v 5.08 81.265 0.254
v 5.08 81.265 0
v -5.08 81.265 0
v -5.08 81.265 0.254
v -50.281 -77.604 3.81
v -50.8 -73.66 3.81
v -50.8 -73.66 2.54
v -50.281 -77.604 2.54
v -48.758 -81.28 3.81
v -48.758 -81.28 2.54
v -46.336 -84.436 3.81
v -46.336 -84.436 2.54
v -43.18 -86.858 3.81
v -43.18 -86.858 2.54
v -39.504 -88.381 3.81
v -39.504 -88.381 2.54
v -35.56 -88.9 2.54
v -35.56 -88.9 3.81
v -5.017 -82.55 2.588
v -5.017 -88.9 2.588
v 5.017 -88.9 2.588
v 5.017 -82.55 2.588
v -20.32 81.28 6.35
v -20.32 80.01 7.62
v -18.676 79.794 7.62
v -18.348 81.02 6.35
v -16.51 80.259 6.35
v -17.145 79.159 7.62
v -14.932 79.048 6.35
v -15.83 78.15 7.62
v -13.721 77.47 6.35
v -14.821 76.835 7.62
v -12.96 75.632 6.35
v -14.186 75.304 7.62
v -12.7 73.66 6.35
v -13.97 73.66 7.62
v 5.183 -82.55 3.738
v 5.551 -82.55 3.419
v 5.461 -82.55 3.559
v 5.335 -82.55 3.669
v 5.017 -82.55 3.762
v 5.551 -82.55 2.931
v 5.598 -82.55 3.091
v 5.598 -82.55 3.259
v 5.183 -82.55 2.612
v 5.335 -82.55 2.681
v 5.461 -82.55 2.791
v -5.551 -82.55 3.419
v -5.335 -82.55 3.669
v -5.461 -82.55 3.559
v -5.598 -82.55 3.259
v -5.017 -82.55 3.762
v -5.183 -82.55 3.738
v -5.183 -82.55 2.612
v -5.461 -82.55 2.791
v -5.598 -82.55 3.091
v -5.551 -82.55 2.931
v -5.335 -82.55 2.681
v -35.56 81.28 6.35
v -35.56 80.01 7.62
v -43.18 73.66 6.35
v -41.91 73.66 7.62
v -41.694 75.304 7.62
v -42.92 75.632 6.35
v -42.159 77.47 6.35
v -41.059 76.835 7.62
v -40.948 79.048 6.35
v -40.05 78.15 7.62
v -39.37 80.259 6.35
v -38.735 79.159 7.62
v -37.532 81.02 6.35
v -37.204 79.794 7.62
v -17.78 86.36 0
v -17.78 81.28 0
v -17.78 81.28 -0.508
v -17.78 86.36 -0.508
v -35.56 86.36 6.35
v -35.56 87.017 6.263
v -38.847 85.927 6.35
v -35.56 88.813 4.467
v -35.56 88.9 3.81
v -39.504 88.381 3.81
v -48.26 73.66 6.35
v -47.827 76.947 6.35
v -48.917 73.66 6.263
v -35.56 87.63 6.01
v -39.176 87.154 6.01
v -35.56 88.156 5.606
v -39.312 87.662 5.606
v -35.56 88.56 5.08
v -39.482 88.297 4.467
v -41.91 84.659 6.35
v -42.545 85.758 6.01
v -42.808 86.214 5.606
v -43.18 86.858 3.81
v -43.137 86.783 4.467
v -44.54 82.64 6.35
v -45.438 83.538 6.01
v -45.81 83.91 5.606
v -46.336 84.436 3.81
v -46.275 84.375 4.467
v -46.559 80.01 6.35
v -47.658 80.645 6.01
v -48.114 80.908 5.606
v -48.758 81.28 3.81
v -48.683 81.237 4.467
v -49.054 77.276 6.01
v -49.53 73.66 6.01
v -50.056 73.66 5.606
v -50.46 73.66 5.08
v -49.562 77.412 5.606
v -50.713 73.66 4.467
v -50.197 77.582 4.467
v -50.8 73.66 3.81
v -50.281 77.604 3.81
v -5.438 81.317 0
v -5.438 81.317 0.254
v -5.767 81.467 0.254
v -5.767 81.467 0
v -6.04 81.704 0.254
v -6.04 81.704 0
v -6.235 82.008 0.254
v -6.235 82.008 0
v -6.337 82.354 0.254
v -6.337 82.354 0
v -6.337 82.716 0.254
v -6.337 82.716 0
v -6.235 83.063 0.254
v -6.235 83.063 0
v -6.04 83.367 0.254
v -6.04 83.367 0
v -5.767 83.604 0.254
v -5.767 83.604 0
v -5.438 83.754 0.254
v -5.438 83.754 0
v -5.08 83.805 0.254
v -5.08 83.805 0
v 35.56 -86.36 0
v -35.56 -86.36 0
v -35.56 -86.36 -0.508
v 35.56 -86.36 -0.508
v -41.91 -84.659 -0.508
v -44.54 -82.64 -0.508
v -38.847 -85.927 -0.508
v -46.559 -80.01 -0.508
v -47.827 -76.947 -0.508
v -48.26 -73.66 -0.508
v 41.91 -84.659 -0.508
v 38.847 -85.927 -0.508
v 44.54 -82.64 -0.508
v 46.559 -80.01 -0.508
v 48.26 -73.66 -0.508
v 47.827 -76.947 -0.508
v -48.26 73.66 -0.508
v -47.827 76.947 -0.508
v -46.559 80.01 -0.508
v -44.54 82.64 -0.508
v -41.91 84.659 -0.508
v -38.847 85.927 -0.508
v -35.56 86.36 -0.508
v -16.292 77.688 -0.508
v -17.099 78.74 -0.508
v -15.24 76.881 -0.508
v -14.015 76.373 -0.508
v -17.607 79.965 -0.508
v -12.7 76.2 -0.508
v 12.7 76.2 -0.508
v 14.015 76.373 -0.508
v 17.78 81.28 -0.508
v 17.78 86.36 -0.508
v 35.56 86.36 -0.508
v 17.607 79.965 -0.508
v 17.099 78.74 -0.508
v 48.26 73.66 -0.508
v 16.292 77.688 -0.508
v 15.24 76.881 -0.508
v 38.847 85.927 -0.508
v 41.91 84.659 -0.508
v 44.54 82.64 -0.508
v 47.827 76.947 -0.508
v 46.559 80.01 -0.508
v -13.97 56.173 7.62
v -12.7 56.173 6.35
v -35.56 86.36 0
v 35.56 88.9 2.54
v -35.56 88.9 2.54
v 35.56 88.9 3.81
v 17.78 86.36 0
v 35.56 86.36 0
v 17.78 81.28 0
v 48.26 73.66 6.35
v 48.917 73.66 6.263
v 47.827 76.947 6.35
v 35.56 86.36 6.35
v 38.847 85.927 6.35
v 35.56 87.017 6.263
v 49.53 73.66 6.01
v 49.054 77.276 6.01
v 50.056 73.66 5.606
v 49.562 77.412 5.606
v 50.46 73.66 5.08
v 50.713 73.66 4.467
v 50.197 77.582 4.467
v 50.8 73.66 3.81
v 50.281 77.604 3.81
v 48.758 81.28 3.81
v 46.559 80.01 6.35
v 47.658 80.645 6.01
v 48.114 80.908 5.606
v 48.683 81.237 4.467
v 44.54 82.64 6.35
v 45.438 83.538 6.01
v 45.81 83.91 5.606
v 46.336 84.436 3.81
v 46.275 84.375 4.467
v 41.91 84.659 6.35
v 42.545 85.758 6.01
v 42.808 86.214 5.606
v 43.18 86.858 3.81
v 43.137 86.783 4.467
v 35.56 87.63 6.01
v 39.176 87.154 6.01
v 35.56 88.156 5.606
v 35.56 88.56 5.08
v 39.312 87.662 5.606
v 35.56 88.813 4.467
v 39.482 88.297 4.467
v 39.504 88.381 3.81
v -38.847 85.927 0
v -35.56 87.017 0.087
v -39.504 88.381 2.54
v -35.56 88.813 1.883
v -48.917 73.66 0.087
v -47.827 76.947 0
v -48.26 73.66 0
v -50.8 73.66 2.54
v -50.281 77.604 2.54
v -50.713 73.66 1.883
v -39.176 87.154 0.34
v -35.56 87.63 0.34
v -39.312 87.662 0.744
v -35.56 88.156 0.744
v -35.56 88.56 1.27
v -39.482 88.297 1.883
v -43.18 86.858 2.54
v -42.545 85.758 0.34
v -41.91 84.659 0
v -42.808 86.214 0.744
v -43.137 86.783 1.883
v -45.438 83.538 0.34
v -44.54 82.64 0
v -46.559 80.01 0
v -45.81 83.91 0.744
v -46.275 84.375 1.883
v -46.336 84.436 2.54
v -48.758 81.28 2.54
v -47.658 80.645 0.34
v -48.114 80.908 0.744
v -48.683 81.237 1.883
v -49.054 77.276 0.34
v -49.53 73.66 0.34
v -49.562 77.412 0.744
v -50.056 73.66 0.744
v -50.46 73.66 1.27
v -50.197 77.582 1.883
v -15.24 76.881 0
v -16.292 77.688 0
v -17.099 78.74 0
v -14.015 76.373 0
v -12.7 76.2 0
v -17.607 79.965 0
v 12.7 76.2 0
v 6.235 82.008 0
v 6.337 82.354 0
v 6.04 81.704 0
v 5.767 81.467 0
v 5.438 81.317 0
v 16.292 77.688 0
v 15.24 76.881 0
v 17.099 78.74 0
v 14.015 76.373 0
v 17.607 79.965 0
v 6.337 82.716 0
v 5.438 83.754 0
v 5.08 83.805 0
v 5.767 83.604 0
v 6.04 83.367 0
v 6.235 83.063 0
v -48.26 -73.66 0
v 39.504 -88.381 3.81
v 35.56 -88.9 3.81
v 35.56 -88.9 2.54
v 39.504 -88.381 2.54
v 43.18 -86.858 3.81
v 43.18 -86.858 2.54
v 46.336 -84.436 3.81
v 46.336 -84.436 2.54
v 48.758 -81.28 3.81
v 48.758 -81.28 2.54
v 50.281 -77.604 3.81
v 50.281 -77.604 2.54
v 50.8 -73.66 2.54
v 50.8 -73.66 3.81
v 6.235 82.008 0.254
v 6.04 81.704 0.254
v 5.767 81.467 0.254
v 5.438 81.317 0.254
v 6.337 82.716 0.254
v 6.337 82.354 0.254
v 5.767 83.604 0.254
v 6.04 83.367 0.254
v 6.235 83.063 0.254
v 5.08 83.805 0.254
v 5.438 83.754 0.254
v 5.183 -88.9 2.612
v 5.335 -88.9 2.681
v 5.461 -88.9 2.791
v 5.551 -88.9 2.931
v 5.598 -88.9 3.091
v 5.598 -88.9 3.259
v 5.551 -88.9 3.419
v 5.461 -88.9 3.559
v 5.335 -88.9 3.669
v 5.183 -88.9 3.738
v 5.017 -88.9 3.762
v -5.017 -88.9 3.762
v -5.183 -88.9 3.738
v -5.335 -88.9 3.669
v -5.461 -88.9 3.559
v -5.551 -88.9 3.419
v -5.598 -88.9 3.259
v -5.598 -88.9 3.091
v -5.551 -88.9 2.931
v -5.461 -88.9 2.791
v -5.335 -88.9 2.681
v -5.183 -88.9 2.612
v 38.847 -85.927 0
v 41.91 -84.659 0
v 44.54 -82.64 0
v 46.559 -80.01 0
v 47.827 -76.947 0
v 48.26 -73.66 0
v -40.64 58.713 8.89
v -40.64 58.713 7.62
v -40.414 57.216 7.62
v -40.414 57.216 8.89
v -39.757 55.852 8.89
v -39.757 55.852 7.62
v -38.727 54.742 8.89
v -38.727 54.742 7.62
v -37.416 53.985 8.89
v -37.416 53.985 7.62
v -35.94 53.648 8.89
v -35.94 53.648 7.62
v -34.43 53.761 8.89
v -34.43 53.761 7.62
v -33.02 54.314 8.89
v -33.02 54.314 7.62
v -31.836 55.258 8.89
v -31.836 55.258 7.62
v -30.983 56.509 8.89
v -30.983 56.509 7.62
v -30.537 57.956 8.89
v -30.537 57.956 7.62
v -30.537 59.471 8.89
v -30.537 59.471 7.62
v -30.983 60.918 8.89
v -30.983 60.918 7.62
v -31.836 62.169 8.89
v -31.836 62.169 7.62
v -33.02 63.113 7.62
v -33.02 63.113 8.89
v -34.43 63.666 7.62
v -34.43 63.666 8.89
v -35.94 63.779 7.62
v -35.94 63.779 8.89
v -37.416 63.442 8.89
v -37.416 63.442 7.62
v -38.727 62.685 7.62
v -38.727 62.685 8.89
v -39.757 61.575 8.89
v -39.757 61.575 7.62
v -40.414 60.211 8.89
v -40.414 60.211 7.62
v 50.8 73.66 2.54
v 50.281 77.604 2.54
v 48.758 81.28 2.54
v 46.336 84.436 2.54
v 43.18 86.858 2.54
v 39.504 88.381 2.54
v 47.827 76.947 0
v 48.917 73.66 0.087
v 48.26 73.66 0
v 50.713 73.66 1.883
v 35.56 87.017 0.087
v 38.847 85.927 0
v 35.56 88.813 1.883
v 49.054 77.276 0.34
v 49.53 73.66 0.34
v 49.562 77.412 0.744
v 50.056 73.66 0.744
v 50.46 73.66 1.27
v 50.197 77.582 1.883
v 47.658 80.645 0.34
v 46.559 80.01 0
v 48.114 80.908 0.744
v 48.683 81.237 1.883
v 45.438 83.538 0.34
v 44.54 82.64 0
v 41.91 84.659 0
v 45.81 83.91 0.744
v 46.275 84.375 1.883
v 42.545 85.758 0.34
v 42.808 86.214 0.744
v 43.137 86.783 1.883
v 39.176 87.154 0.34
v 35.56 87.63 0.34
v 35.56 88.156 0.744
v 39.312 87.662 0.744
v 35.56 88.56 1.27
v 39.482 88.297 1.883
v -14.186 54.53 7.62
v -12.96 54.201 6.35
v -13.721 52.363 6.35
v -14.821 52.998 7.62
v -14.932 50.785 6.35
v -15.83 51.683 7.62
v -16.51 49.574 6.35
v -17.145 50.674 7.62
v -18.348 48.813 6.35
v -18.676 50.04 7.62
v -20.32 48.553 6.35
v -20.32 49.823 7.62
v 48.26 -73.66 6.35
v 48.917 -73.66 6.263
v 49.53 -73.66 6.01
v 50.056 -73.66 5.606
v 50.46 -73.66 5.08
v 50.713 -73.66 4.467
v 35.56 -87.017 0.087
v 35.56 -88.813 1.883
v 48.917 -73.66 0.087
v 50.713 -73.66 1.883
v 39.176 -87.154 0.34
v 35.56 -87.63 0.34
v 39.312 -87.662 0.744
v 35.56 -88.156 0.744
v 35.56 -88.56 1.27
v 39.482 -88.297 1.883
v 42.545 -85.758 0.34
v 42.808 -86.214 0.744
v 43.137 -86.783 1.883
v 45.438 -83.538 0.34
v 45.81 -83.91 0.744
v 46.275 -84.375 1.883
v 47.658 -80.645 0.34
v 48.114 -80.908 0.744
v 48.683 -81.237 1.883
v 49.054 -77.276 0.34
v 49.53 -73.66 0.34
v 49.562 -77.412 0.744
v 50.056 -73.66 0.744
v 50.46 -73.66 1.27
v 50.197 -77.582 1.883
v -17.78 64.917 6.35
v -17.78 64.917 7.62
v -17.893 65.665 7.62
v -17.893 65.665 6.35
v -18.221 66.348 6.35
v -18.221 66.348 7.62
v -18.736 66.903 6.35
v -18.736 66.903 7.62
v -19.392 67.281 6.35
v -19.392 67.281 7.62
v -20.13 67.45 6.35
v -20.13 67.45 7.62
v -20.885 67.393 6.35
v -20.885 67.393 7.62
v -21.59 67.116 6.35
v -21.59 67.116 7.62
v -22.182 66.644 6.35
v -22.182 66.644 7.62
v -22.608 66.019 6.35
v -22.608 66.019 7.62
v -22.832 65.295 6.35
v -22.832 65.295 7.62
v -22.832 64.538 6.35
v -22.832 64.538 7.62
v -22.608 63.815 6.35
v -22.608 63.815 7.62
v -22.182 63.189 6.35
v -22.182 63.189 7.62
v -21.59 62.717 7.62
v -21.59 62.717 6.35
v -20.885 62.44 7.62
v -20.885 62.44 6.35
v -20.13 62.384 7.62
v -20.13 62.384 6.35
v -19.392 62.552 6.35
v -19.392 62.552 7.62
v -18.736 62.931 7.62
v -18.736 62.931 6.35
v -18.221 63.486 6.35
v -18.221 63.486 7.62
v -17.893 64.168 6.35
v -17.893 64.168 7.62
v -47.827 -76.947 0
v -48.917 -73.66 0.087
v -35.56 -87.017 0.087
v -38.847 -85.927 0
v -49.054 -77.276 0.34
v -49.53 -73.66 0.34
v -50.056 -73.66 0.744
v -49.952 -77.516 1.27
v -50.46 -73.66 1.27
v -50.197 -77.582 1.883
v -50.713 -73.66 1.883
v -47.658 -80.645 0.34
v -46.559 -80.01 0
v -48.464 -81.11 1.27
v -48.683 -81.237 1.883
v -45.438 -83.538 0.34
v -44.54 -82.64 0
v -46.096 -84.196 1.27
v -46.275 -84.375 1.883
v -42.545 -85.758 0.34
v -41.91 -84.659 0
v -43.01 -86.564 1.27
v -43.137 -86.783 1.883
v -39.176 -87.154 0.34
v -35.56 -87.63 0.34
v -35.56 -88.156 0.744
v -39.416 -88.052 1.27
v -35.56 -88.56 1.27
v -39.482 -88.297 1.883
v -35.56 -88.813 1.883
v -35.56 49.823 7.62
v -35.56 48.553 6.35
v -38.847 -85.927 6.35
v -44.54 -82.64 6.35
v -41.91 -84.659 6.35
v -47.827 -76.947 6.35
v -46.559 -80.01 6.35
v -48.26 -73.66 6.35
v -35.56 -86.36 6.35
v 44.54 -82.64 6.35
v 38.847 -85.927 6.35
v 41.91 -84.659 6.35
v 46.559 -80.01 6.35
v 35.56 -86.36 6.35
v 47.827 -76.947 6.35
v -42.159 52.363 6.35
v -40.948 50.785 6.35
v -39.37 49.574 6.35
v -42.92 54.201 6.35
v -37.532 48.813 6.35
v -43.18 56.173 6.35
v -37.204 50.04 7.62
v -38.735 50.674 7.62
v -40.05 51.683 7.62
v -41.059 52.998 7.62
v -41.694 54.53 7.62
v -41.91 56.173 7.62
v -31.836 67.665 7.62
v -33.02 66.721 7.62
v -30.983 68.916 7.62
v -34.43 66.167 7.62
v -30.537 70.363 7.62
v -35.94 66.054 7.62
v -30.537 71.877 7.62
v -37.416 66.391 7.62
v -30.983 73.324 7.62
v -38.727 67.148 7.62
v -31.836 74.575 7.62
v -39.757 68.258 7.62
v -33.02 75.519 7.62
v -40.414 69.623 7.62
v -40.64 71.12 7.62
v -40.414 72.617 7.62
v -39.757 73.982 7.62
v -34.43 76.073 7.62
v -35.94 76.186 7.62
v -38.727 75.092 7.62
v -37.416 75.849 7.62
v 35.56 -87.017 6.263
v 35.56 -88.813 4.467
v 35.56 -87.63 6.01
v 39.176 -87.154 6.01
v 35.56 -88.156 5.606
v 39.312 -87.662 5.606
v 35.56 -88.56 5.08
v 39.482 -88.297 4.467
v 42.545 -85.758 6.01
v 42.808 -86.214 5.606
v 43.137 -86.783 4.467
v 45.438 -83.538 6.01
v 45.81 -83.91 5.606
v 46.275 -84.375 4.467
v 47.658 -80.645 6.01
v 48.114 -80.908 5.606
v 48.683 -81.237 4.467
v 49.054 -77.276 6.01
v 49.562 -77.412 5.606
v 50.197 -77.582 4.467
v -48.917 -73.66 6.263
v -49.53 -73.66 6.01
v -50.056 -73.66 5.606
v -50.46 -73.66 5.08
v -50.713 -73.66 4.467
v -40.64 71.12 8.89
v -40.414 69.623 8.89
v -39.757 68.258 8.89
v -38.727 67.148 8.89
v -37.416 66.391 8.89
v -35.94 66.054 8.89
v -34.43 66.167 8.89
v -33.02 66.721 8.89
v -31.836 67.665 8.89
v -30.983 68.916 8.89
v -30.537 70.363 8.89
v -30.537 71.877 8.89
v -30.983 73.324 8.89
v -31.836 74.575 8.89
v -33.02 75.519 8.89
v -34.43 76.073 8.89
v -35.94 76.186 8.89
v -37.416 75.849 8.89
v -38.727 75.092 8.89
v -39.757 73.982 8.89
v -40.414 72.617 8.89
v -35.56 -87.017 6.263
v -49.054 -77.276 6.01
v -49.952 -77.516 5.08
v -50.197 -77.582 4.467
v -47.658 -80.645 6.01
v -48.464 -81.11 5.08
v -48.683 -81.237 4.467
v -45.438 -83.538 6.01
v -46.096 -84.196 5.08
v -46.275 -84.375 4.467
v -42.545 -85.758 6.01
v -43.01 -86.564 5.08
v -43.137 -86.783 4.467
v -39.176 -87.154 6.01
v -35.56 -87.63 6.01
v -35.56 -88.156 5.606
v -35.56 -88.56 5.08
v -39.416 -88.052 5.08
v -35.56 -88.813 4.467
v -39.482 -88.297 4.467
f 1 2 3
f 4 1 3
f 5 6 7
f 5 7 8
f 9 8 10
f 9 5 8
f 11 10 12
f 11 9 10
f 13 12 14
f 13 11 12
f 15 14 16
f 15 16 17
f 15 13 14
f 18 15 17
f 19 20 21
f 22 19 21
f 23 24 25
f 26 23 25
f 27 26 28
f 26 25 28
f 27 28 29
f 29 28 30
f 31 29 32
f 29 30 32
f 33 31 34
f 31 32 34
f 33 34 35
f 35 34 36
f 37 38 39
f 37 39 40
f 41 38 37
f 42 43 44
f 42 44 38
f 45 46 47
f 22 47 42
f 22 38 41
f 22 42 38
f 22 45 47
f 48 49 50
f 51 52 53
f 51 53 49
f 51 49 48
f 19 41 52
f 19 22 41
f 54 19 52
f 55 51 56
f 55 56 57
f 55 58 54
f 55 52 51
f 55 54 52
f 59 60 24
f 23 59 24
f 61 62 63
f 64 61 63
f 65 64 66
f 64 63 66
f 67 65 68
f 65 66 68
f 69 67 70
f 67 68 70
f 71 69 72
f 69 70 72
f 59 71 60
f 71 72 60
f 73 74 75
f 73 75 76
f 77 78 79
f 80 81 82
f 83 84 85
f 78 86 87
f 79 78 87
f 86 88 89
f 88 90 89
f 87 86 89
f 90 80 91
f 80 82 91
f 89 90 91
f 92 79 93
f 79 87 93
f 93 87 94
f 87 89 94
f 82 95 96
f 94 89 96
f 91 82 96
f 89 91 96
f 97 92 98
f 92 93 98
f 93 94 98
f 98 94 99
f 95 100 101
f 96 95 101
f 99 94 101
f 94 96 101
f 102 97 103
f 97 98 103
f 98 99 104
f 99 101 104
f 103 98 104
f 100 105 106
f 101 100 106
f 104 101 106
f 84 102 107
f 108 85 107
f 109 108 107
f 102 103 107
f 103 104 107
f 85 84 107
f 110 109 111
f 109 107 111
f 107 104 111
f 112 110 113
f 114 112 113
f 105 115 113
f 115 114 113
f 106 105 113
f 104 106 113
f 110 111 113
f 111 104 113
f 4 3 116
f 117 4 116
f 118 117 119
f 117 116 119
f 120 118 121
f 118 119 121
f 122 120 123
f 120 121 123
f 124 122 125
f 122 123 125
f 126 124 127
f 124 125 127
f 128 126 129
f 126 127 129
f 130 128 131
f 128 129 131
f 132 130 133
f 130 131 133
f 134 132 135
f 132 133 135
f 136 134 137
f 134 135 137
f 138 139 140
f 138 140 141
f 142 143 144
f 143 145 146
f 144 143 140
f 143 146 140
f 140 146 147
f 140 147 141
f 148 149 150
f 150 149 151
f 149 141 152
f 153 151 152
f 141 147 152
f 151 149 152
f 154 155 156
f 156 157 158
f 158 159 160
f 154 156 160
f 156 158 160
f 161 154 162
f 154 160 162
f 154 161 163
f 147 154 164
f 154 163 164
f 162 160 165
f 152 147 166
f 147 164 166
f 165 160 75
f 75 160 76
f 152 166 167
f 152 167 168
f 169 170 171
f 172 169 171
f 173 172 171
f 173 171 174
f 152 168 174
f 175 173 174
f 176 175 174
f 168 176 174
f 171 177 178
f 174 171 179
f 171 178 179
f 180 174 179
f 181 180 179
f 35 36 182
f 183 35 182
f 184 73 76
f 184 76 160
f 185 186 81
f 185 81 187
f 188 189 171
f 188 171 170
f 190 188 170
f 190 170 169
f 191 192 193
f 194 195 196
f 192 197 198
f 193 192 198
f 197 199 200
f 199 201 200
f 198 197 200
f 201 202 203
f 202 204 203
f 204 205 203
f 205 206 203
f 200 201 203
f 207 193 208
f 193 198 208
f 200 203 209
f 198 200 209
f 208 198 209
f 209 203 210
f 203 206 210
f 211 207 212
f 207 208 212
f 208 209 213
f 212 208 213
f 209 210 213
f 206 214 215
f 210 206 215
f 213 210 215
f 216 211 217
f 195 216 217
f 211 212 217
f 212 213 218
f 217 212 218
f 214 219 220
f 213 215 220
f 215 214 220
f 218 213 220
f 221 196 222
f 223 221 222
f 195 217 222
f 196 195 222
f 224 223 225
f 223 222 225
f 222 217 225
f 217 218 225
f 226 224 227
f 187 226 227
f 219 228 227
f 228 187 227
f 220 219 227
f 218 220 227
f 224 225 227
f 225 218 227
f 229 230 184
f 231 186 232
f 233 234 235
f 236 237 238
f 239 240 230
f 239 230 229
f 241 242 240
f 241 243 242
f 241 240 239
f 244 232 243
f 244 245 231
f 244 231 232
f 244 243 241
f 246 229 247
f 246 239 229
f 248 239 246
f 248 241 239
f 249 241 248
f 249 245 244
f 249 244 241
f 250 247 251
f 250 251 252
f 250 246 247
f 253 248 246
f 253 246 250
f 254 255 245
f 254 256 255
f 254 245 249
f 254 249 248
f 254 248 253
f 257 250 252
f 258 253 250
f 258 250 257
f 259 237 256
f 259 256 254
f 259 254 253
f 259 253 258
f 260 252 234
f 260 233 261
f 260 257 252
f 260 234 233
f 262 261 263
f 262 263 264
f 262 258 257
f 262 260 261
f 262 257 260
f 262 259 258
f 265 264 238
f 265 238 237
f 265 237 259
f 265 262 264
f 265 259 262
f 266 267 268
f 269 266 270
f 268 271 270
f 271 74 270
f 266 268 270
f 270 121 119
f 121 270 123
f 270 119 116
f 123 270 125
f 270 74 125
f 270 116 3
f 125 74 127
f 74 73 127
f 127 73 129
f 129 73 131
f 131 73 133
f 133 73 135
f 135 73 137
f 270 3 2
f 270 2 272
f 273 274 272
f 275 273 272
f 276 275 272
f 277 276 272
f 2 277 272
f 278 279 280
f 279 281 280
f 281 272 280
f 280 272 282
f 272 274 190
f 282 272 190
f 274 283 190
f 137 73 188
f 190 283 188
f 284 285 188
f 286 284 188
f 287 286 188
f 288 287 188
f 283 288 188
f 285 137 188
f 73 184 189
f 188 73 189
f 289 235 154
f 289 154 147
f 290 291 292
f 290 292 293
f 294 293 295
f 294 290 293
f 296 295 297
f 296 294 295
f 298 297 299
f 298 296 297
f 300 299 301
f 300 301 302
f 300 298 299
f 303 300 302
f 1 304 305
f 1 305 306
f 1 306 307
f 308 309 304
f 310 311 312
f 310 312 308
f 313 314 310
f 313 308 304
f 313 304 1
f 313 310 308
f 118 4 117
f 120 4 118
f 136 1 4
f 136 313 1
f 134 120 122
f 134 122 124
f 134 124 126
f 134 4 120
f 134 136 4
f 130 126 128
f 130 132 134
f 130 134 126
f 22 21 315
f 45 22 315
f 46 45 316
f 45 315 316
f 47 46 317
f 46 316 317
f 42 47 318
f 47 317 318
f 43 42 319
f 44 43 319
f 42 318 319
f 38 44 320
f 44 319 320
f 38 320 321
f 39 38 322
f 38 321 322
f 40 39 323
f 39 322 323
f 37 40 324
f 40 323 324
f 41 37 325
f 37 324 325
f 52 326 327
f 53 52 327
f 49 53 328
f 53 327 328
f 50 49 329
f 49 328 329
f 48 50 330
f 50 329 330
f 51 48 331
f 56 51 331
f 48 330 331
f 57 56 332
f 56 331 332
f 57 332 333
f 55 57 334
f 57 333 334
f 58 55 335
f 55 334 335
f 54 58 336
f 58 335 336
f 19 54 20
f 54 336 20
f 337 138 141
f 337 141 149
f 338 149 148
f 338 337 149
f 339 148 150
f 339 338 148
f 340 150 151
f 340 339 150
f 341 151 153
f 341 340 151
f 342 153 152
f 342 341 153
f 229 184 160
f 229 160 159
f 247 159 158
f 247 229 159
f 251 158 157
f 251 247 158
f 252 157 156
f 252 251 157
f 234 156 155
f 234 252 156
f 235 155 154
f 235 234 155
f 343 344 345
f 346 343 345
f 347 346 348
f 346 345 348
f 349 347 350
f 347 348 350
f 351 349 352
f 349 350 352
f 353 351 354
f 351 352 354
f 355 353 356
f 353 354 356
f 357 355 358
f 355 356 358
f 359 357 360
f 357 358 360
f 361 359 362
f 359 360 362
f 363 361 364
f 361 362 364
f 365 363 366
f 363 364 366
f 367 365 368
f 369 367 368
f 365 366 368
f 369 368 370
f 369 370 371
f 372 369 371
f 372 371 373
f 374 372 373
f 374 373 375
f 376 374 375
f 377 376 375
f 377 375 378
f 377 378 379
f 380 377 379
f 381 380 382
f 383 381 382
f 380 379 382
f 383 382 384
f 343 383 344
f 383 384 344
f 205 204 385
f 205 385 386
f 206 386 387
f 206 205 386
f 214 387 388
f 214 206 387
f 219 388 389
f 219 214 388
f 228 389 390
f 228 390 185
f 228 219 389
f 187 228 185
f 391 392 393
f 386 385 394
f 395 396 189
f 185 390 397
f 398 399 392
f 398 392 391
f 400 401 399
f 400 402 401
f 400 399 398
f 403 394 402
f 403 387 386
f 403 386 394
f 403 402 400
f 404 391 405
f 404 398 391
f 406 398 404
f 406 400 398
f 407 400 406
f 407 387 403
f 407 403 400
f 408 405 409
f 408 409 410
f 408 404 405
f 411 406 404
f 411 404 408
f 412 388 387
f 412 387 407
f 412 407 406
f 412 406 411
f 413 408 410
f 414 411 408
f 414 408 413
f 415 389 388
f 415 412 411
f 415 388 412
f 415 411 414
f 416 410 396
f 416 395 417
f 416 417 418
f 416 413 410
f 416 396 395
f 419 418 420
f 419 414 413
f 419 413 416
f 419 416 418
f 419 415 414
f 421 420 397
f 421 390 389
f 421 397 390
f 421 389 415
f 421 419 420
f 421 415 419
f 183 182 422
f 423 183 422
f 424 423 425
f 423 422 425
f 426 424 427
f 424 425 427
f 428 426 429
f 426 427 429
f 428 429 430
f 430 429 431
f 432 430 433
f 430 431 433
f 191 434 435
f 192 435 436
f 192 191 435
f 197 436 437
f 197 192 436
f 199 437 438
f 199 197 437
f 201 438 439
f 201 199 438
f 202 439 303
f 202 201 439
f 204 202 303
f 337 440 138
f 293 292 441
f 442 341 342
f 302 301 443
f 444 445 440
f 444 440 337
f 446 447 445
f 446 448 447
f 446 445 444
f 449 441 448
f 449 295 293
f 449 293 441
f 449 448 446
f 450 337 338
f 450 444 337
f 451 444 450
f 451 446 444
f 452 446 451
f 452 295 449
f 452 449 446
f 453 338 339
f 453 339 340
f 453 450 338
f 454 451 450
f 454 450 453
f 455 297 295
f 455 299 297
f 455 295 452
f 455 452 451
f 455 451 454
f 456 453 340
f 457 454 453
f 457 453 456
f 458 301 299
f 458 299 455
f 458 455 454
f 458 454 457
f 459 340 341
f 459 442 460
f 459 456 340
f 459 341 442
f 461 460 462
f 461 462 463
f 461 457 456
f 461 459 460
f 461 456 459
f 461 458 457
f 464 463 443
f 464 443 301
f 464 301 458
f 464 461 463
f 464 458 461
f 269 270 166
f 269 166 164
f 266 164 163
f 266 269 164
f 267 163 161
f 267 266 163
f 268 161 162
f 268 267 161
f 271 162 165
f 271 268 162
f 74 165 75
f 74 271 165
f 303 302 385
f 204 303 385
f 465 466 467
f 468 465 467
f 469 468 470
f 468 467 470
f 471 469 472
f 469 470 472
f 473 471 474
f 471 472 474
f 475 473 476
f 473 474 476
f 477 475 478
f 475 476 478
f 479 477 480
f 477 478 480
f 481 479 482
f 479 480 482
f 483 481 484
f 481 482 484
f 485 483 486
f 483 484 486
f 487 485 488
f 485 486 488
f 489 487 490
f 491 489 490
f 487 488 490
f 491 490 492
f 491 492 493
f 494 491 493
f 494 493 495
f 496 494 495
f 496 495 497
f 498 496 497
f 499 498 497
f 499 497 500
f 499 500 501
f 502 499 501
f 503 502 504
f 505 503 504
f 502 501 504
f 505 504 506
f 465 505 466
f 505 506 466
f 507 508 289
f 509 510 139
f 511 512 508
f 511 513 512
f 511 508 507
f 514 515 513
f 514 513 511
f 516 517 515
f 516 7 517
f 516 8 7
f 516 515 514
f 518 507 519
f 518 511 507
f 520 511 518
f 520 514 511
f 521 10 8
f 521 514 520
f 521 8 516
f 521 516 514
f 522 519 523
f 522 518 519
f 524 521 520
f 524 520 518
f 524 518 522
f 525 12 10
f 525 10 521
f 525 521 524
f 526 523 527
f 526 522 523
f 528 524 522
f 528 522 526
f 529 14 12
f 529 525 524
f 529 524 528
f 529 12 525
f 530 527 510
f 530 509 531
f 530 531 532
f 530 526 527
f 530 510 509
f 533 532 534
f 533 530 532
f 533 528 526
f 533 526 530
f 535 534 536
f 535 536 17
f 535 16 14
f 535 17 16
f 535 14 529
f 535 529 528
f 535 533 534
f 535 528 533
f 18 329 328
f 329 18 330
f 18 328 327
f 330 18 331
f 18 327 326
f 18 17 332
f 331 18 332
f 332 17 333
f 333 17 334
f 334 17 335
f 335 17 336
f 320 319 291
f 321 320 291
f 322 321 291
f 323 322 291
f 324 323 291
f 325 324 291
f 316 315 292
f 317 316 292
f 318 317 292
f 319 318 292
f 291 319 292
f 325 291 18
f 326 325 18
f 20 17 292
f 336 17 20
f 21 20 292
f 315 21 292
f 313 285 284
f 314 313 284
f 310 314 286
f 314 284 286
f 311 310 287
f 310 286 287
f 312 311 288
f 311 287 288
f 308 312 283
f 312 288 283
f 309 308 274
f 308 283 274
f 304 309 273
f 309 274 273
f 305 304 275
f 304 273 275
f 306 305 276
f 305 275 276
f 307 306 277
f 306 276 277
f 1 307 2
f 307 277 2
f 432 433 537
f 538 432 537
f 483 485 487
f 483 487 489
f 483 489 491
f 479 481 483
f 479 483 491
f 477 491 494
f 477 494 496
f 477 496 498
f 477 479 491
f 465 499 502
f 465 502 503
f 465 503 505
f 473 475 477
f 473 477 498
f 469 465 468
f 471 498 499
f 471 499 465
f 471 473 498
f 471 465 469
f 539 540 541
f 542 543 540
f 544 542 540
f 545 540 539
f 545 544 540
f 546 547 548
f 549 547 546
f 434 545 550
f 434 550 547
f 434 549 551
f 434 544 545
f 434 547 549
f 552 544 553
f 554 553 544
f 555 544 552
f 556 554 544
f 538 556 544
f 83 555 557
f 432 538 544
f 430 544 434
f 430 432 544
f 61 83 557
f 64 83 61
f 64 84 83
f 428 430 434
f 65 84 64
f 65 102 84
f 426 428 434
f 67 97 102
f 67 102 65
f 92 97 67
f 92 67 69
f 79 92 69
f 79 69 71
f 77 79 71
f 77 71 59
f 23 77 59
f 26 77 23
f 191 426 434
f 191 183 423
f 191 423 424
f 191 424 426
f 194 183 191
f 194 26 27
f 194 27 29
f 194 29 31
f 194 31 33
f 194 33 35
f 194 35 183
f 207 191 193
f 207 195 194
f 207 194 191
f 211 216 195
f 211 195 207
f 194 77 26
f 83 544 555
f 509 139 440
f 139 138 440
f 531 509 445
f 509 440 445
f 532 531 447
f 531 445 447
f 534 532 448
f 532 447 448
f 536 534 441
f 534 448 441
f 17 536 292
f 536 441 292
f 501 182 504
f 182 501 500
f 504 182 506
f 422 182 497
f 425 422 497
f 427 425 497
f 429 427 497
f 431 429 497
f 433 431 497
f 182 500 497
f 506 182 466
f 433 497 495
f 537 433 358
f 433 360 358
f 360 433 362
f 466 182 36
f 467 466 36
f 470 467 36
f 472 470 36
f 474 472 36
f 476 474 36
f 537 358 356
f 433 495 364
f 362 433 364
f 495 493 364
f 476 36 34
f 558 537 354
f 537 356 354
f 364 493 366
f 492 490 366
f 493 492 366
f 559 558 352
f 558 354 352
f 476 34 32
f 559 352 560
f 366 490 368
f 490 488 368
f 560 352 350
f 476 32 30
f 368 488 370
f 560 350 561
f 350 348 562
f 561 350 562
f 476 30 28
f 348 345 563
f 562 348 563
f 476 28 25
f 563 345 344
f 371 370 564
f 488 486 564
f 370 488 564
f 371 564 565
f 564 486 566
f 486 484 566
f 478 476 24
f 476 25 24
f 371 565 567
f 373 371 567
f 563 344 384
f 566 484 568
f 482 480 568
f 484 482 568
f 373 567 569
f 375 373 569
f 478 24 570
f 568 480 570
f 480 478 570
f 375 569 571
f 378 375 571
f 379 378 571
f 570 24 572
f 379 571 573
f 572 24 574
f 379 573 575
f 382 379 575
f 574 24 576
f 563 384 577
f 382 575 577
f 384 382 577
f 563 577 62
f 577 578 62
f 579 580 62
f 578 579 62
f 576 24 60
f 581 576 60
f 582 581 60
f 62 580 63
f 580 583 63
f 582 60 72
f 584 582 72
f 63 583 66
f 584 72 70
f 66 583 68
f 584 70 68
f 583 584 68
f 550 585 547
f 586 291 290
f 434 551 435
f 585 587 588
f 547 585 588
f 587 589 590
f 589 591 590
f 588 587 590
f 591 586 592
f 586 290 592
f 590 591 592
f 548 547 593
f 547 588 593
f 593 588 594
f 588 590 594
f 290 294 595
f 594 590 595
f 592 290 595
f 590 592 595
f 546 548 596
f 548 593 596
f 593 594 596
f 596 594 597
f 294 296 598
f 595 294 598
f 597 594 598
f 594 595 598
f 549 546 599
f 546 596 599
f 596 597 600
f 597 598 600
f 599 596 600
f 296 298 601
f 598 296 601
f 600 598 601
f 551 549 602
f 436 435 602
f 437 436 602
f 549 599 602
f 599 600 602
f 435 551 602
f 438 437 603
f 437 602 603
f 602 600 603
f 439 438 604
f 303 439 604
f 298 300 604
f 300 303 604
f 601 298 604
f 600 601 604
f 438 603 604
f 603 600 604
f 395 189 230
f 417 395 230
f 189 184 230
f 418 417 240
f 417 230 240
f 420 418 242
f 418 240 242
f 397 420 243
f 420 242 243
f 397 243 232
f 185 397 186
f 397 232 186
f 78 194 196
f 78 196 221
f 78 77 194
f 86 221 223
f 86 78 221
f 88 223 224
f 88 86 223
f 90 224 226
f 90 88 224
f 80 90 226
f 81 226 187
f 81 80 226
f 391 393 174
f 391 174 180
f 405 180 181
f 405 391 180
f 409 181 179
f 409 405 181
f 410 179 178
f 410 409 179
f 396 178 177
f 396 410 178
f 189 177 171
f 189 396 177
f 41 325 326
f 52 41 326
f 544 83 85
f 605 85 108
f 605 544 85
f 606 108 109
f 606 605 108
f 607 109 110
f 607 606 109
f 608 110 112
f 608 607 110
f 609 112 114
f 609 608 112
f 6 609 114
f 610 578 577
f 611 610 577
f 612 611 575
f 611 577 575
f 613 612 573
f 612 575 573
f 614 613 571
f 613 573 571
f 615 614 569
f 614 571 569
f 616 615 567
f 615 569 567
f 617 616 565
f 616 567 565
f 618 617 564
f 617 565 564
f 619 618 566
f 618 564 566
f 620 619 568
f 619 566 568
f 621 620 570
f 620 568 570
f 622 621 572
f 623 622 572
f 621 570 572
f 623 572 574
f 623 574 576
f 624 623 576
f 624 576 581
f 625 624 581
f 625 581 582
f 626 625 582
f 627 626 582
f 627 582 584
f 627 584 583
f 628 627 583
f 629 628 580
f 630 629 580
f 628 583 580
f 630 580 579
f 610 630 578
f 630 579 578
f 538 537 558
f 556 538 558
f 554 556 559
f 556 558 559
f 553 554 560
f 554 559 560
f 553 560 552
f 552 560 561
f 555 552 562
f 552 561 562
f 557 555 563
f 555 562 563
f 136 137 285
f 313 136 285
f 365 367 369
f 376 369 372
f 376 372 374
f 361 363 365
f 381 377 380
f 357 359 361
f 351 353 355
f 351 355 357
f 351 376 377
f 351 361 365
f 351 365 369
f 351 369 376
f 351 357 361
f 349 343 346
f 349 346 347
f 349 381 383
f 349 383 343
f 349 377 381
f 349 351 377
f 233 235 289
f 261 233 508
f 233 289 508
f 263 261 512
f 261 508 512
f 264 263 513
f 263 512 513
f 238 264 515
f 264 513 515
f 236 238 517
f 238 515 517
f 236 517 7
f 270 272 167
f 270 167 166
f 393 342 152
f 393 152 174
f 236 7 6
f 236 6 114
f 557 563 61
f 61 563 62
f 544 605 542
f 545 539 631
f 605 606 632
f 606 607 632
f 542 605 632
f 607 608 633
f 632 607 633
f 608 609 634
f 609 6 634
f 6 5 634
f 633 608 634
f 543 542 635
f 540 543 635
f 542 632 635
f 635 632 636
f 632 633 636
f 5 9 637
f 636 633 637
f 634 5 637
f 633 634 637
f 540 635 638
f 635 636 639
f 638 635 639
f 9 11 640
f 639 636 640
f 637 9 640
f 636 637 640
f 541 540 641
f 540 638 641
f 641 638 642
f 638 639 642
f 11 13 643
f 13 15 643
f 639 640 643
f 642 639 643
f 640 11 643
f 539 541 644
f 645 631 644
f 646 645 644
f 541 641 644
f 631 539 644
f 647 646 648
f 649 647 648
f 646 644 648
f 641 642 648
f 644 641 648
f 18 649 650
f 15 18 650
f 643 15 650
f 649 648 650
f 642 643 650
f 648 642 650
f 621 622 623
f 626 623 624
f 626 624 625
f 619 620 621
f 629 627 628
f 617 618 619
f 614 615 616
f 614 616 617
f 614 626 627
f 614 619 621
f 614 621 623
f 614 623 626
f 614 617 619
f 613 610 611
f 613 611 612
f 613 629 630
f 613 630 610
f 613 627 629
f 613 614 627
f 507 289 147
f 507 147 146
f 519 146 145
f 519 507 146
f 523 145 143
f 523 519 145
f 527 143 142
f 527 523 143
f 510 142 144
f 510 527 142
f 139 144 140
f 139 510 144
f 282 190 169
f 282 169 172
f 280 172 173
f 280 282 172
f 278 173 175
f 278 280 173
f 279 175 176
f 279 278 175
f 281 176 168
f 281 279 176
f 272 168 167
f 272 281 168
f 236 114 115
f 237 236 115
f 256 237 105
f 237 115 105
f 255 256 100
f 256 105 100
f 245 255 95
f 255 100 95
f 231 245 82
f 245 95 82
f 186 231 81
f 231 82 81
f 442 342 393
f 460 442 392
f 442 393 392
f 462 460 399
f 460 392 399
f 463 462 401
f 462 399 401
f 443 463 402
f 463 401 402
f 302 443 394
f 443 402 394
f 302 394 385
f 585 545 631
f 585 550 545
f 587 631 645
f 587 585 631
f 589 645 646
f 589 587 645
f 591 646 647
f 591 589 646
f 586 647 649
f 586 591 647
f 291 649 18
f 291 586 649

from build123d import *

# Parameters (mm, degrees)
SKETCH1_W            = 101.6
SKETCH1_H            = 177.8
BOSS_EXTRUDE2_DEPTH  = 6.35
FILLET1_R            = 15.24
BOSS_EXTRUDE5_DEPTH  = 0.508
CUT_EXTRUDE1_DEPTH   = 0.254
FILLET3_R            = 2.54
FILLET4_R            = 2.54
BOSS_EXTRUDE7_DEPTH  = 1.27
SKETCH6_R            = 5.08
BOSS_EXTRUDE10_DEPTH = 1.27
SKETCH7_R            = 2.54
CUT_EXTRUDE2_DEPTH   = 1.27
CHAMFER1_SIZE        = 1.27
CUT_EXTRUDE6_DEPTH   = 6.35


with BuildPart() as part:
    # Sketch1 → Boss-Extrude2 (new body)
    with BuildSketch(Plane.XY):
        Rectangle(SKETCH1_W, SKETCH1_H)
    extrude(amount=BOSS_EXTRUDE2_DEPTH)

    # Fillet1
    fillet1_edges = [part.edges().sort_by_distance(p)[0] for p in [
        (50.8, -88.9, 3.175),
        (-50.8, -88.9, 3.175),
        (-50.8, 88.9, 3.175),
        (50.8, 88.9, 3.175),
    ]]
    fillet(fillet1_edges, radius=FILLET1_R)

    # Sketch2 → Boss-Extrude5 (add)
    with BuildSketch(Plane.XY):
        with BuildLine():
            Line((12.7, 76.2), (-12.7, 76.2))
            ThreePointArc((-12.7, 76.2), (-16.292102448, 77.687897552), (-17.78, 81.28))
            Line((-17.78, 81.28), (-17.78, 86.36))
            Line((-17.78, 86.36), (-35.56, 86.36))
            ThreePointArc((-35.56, 86.36), (-44.540256121, 82.640256121), (-48.26, 73.66))
            Line((-48.26, 73.66), (-48.26, -73.66))
            ThreePointArc((-48.26, -73.66), (-44.540256121, -82.640256121), (-35.56, -86.36))
            Line((-35.56, -86.36), (35.56, -86.36))
            ThreePointArc((35.56, -86.36), (44.540256121, -82.640256121), (48.26, -73.66))
            Line((48.26, -73.66), (48.26, 73.66))
            ThreePointArc((48.26, 73.66), (44.540256121, 82.640256121), (35.56, 86.36))
            Line((35.56, 86.36), (17.78, 86.36))
            Line((17.78, 86.36), (17.78, 81.28))
            ThreePointArc((17.78, 81.28), (16.292102448, 77.687897552), (12.7, 76.2))
        make_face()
    extrude(amount=-BOSS_EXTRUDE5_DEPTH)

    # Sketch3 → Cut-Extrude1 (cut)
    with BuildSketch(Plane.XY):
        with BuildLine():
            Line((5.08, 81.26519761), (-5.08, 81.26519761))
            ThreePointArc((-5.08, 81.26519761), (-6.35, 82.53519761), (-5.08, 83.80519761))
            Line((-5.08, 83.80519761), (5.08, 83.80519761))
            ThreePointArc((5.08, 83.80519761), (6.35, 82.53519761), (5.08, 81.26519761))
        make_face()
    extrude(amount=CUT_EXTRUDE1_DEPTH, mode=Mode.SUBTRACT)

    # Fillet3
    fillet3_edges = [part.edges().sort_by_distance(p)[0] for p in [
        (0, -88.9, 0),
        (50.8, 0, 0),
        (-50.8, 0, 0),
        (0, 88.9, 0),
        (-46.336307345, 84.436307345, 0),
        (46.336307345, 84.436307345, 0),
        (46.336307345, -84.436307345, 0),
        (-46.336307345, -84.436307345, 0),
    ]]
    fillet(fillet3_edges, radius=FILLET3_R - 0.0001)  # a hair under: the kernel refuses the full size

    # Fillet4
    fillet4_edges = [part.edges().sort_by_distance(p)[0] for p in [
        (0, -88.9, 6.35),
        (-50.8, 0, 6.35),
        (50.8, 0, 6.35),
        (0, 88.9, 6.35),
        (-46.336307345, 84.436307345, 6.35),
        (46.336307345, 84.436307345, 6.35),
        (46.336307345, -84.436307345, 6.35),
        (-46.336307345, -84.436307345, 6.35),
    ]]
    fillet(fillet4_edges, radius=FILLET4_R)

    # Sketch4 → Boss-Extrude7 (add)
    with BuildSketch(Plane.XY.offset(6.35)):
        with BuildLine():
            Line((-12.7, 73.66), (-12.7, 56.173421011))
            ThreePointArc((-12.7, 56.173421011), (-14.931846327, 50.785267338), (-20.32, 48.553421011))
            Line((-20.32, 48.553421011), (-35.56, 48.553421011))
            ThreePointArc((-35.56, 48.553421011), (-40.948153673, 50.785267338), (-43.18, 56.173421011))
            Line((-43.18, 56.173421011), (-43.18, 73.66))
            ThreePointArc((-43.18, 73.66), (-40.948153673, 79.048153673), (-35.56, 81.28))
            Line((-35.56, 81.28), (-20.32, 81.28))
            ThreePointArc((-20.32, 81.28), (-14.931846327, 79.048153673), (-12.7, 73.66))
        make_face()
    extrude(amount=BOSS_EXTRUDE7_DEPTH)

    # Sketch6 → Boss-Extrude10 (add)
    with BuildSketch(Plane.XY.offset(7.62)):
        with Locations(Location((-35.56, 58.713421011, 0), (0, 0, 180))):
            Circle(SKETCH6_R)
        with Locations(Location((-35.56, 71.12, 0), (0, 0, 180))):
            Circle(SKETCH6_R)
    extrude(amount=BOSS_EXTRUDE10_DEPTH)

    # Sketch7 → Cut-Extrude2 (cut)
    with BuildSketch(Plane.XY.offset(7.62)):
        with Locations((-20.32, 64.916710506)):
            Circle(SKETCH7_R)
    extrude(amount=-CUT_EXTRUDE2_DEPTH, mode=Mode.SUBTRACT)

    # Chamfer1
    chamfer1_edges = [part.edges().sort_by_distance(p)[0] for p in [
        (-27.94, 81.28, 7.62),
        (-14.931846327, 79.048153673, 7.62),
        (-12.7, 64.916710506, 7.62),
        (-14.931846327, 50.785267338, 7.62),
        (-27.94, 48.553421011, 7.62),
        (-40.948153673, 50.785267338, 7.62),
        (-43.18, 64.916710506, 7.62),
        (-40.948153673, 79.048153673, 7.62),
    ]]
    chamfer(chamfer1_edges, length=CHAMFER1_SIZE - 0.0001)  # a hair under: the kernel refuses the full size

    # Sketch9 → Cut-Extrude6 (cut)
    with BuildSketch(Plane(origin=(0, -88.9, 0), x_dir=(1, 0, 0), z_dir=(0, 1, 0))):
        with BuildLine():
            Line((5.017161758, -3.762137851), (-5.017161758, -3.762137851))
            ThreePointArc((-5.017161758, -3.762137851), (-5.604299609, -3.175), (-5.017161758, -2.587862149))
            Line((-5.017161758, -2.587862149), (5.017161758, -2.587862149))
            ThreePointArc((5.017161758, -2.587862149), (5.604299609, -3.175), (5.017161758, -3.762137851))
        make_face()
    extrude(amount=CUT_EXTRUDE6_DEPTH, mode=Mode.SUBTRACT)


solid = part.part
